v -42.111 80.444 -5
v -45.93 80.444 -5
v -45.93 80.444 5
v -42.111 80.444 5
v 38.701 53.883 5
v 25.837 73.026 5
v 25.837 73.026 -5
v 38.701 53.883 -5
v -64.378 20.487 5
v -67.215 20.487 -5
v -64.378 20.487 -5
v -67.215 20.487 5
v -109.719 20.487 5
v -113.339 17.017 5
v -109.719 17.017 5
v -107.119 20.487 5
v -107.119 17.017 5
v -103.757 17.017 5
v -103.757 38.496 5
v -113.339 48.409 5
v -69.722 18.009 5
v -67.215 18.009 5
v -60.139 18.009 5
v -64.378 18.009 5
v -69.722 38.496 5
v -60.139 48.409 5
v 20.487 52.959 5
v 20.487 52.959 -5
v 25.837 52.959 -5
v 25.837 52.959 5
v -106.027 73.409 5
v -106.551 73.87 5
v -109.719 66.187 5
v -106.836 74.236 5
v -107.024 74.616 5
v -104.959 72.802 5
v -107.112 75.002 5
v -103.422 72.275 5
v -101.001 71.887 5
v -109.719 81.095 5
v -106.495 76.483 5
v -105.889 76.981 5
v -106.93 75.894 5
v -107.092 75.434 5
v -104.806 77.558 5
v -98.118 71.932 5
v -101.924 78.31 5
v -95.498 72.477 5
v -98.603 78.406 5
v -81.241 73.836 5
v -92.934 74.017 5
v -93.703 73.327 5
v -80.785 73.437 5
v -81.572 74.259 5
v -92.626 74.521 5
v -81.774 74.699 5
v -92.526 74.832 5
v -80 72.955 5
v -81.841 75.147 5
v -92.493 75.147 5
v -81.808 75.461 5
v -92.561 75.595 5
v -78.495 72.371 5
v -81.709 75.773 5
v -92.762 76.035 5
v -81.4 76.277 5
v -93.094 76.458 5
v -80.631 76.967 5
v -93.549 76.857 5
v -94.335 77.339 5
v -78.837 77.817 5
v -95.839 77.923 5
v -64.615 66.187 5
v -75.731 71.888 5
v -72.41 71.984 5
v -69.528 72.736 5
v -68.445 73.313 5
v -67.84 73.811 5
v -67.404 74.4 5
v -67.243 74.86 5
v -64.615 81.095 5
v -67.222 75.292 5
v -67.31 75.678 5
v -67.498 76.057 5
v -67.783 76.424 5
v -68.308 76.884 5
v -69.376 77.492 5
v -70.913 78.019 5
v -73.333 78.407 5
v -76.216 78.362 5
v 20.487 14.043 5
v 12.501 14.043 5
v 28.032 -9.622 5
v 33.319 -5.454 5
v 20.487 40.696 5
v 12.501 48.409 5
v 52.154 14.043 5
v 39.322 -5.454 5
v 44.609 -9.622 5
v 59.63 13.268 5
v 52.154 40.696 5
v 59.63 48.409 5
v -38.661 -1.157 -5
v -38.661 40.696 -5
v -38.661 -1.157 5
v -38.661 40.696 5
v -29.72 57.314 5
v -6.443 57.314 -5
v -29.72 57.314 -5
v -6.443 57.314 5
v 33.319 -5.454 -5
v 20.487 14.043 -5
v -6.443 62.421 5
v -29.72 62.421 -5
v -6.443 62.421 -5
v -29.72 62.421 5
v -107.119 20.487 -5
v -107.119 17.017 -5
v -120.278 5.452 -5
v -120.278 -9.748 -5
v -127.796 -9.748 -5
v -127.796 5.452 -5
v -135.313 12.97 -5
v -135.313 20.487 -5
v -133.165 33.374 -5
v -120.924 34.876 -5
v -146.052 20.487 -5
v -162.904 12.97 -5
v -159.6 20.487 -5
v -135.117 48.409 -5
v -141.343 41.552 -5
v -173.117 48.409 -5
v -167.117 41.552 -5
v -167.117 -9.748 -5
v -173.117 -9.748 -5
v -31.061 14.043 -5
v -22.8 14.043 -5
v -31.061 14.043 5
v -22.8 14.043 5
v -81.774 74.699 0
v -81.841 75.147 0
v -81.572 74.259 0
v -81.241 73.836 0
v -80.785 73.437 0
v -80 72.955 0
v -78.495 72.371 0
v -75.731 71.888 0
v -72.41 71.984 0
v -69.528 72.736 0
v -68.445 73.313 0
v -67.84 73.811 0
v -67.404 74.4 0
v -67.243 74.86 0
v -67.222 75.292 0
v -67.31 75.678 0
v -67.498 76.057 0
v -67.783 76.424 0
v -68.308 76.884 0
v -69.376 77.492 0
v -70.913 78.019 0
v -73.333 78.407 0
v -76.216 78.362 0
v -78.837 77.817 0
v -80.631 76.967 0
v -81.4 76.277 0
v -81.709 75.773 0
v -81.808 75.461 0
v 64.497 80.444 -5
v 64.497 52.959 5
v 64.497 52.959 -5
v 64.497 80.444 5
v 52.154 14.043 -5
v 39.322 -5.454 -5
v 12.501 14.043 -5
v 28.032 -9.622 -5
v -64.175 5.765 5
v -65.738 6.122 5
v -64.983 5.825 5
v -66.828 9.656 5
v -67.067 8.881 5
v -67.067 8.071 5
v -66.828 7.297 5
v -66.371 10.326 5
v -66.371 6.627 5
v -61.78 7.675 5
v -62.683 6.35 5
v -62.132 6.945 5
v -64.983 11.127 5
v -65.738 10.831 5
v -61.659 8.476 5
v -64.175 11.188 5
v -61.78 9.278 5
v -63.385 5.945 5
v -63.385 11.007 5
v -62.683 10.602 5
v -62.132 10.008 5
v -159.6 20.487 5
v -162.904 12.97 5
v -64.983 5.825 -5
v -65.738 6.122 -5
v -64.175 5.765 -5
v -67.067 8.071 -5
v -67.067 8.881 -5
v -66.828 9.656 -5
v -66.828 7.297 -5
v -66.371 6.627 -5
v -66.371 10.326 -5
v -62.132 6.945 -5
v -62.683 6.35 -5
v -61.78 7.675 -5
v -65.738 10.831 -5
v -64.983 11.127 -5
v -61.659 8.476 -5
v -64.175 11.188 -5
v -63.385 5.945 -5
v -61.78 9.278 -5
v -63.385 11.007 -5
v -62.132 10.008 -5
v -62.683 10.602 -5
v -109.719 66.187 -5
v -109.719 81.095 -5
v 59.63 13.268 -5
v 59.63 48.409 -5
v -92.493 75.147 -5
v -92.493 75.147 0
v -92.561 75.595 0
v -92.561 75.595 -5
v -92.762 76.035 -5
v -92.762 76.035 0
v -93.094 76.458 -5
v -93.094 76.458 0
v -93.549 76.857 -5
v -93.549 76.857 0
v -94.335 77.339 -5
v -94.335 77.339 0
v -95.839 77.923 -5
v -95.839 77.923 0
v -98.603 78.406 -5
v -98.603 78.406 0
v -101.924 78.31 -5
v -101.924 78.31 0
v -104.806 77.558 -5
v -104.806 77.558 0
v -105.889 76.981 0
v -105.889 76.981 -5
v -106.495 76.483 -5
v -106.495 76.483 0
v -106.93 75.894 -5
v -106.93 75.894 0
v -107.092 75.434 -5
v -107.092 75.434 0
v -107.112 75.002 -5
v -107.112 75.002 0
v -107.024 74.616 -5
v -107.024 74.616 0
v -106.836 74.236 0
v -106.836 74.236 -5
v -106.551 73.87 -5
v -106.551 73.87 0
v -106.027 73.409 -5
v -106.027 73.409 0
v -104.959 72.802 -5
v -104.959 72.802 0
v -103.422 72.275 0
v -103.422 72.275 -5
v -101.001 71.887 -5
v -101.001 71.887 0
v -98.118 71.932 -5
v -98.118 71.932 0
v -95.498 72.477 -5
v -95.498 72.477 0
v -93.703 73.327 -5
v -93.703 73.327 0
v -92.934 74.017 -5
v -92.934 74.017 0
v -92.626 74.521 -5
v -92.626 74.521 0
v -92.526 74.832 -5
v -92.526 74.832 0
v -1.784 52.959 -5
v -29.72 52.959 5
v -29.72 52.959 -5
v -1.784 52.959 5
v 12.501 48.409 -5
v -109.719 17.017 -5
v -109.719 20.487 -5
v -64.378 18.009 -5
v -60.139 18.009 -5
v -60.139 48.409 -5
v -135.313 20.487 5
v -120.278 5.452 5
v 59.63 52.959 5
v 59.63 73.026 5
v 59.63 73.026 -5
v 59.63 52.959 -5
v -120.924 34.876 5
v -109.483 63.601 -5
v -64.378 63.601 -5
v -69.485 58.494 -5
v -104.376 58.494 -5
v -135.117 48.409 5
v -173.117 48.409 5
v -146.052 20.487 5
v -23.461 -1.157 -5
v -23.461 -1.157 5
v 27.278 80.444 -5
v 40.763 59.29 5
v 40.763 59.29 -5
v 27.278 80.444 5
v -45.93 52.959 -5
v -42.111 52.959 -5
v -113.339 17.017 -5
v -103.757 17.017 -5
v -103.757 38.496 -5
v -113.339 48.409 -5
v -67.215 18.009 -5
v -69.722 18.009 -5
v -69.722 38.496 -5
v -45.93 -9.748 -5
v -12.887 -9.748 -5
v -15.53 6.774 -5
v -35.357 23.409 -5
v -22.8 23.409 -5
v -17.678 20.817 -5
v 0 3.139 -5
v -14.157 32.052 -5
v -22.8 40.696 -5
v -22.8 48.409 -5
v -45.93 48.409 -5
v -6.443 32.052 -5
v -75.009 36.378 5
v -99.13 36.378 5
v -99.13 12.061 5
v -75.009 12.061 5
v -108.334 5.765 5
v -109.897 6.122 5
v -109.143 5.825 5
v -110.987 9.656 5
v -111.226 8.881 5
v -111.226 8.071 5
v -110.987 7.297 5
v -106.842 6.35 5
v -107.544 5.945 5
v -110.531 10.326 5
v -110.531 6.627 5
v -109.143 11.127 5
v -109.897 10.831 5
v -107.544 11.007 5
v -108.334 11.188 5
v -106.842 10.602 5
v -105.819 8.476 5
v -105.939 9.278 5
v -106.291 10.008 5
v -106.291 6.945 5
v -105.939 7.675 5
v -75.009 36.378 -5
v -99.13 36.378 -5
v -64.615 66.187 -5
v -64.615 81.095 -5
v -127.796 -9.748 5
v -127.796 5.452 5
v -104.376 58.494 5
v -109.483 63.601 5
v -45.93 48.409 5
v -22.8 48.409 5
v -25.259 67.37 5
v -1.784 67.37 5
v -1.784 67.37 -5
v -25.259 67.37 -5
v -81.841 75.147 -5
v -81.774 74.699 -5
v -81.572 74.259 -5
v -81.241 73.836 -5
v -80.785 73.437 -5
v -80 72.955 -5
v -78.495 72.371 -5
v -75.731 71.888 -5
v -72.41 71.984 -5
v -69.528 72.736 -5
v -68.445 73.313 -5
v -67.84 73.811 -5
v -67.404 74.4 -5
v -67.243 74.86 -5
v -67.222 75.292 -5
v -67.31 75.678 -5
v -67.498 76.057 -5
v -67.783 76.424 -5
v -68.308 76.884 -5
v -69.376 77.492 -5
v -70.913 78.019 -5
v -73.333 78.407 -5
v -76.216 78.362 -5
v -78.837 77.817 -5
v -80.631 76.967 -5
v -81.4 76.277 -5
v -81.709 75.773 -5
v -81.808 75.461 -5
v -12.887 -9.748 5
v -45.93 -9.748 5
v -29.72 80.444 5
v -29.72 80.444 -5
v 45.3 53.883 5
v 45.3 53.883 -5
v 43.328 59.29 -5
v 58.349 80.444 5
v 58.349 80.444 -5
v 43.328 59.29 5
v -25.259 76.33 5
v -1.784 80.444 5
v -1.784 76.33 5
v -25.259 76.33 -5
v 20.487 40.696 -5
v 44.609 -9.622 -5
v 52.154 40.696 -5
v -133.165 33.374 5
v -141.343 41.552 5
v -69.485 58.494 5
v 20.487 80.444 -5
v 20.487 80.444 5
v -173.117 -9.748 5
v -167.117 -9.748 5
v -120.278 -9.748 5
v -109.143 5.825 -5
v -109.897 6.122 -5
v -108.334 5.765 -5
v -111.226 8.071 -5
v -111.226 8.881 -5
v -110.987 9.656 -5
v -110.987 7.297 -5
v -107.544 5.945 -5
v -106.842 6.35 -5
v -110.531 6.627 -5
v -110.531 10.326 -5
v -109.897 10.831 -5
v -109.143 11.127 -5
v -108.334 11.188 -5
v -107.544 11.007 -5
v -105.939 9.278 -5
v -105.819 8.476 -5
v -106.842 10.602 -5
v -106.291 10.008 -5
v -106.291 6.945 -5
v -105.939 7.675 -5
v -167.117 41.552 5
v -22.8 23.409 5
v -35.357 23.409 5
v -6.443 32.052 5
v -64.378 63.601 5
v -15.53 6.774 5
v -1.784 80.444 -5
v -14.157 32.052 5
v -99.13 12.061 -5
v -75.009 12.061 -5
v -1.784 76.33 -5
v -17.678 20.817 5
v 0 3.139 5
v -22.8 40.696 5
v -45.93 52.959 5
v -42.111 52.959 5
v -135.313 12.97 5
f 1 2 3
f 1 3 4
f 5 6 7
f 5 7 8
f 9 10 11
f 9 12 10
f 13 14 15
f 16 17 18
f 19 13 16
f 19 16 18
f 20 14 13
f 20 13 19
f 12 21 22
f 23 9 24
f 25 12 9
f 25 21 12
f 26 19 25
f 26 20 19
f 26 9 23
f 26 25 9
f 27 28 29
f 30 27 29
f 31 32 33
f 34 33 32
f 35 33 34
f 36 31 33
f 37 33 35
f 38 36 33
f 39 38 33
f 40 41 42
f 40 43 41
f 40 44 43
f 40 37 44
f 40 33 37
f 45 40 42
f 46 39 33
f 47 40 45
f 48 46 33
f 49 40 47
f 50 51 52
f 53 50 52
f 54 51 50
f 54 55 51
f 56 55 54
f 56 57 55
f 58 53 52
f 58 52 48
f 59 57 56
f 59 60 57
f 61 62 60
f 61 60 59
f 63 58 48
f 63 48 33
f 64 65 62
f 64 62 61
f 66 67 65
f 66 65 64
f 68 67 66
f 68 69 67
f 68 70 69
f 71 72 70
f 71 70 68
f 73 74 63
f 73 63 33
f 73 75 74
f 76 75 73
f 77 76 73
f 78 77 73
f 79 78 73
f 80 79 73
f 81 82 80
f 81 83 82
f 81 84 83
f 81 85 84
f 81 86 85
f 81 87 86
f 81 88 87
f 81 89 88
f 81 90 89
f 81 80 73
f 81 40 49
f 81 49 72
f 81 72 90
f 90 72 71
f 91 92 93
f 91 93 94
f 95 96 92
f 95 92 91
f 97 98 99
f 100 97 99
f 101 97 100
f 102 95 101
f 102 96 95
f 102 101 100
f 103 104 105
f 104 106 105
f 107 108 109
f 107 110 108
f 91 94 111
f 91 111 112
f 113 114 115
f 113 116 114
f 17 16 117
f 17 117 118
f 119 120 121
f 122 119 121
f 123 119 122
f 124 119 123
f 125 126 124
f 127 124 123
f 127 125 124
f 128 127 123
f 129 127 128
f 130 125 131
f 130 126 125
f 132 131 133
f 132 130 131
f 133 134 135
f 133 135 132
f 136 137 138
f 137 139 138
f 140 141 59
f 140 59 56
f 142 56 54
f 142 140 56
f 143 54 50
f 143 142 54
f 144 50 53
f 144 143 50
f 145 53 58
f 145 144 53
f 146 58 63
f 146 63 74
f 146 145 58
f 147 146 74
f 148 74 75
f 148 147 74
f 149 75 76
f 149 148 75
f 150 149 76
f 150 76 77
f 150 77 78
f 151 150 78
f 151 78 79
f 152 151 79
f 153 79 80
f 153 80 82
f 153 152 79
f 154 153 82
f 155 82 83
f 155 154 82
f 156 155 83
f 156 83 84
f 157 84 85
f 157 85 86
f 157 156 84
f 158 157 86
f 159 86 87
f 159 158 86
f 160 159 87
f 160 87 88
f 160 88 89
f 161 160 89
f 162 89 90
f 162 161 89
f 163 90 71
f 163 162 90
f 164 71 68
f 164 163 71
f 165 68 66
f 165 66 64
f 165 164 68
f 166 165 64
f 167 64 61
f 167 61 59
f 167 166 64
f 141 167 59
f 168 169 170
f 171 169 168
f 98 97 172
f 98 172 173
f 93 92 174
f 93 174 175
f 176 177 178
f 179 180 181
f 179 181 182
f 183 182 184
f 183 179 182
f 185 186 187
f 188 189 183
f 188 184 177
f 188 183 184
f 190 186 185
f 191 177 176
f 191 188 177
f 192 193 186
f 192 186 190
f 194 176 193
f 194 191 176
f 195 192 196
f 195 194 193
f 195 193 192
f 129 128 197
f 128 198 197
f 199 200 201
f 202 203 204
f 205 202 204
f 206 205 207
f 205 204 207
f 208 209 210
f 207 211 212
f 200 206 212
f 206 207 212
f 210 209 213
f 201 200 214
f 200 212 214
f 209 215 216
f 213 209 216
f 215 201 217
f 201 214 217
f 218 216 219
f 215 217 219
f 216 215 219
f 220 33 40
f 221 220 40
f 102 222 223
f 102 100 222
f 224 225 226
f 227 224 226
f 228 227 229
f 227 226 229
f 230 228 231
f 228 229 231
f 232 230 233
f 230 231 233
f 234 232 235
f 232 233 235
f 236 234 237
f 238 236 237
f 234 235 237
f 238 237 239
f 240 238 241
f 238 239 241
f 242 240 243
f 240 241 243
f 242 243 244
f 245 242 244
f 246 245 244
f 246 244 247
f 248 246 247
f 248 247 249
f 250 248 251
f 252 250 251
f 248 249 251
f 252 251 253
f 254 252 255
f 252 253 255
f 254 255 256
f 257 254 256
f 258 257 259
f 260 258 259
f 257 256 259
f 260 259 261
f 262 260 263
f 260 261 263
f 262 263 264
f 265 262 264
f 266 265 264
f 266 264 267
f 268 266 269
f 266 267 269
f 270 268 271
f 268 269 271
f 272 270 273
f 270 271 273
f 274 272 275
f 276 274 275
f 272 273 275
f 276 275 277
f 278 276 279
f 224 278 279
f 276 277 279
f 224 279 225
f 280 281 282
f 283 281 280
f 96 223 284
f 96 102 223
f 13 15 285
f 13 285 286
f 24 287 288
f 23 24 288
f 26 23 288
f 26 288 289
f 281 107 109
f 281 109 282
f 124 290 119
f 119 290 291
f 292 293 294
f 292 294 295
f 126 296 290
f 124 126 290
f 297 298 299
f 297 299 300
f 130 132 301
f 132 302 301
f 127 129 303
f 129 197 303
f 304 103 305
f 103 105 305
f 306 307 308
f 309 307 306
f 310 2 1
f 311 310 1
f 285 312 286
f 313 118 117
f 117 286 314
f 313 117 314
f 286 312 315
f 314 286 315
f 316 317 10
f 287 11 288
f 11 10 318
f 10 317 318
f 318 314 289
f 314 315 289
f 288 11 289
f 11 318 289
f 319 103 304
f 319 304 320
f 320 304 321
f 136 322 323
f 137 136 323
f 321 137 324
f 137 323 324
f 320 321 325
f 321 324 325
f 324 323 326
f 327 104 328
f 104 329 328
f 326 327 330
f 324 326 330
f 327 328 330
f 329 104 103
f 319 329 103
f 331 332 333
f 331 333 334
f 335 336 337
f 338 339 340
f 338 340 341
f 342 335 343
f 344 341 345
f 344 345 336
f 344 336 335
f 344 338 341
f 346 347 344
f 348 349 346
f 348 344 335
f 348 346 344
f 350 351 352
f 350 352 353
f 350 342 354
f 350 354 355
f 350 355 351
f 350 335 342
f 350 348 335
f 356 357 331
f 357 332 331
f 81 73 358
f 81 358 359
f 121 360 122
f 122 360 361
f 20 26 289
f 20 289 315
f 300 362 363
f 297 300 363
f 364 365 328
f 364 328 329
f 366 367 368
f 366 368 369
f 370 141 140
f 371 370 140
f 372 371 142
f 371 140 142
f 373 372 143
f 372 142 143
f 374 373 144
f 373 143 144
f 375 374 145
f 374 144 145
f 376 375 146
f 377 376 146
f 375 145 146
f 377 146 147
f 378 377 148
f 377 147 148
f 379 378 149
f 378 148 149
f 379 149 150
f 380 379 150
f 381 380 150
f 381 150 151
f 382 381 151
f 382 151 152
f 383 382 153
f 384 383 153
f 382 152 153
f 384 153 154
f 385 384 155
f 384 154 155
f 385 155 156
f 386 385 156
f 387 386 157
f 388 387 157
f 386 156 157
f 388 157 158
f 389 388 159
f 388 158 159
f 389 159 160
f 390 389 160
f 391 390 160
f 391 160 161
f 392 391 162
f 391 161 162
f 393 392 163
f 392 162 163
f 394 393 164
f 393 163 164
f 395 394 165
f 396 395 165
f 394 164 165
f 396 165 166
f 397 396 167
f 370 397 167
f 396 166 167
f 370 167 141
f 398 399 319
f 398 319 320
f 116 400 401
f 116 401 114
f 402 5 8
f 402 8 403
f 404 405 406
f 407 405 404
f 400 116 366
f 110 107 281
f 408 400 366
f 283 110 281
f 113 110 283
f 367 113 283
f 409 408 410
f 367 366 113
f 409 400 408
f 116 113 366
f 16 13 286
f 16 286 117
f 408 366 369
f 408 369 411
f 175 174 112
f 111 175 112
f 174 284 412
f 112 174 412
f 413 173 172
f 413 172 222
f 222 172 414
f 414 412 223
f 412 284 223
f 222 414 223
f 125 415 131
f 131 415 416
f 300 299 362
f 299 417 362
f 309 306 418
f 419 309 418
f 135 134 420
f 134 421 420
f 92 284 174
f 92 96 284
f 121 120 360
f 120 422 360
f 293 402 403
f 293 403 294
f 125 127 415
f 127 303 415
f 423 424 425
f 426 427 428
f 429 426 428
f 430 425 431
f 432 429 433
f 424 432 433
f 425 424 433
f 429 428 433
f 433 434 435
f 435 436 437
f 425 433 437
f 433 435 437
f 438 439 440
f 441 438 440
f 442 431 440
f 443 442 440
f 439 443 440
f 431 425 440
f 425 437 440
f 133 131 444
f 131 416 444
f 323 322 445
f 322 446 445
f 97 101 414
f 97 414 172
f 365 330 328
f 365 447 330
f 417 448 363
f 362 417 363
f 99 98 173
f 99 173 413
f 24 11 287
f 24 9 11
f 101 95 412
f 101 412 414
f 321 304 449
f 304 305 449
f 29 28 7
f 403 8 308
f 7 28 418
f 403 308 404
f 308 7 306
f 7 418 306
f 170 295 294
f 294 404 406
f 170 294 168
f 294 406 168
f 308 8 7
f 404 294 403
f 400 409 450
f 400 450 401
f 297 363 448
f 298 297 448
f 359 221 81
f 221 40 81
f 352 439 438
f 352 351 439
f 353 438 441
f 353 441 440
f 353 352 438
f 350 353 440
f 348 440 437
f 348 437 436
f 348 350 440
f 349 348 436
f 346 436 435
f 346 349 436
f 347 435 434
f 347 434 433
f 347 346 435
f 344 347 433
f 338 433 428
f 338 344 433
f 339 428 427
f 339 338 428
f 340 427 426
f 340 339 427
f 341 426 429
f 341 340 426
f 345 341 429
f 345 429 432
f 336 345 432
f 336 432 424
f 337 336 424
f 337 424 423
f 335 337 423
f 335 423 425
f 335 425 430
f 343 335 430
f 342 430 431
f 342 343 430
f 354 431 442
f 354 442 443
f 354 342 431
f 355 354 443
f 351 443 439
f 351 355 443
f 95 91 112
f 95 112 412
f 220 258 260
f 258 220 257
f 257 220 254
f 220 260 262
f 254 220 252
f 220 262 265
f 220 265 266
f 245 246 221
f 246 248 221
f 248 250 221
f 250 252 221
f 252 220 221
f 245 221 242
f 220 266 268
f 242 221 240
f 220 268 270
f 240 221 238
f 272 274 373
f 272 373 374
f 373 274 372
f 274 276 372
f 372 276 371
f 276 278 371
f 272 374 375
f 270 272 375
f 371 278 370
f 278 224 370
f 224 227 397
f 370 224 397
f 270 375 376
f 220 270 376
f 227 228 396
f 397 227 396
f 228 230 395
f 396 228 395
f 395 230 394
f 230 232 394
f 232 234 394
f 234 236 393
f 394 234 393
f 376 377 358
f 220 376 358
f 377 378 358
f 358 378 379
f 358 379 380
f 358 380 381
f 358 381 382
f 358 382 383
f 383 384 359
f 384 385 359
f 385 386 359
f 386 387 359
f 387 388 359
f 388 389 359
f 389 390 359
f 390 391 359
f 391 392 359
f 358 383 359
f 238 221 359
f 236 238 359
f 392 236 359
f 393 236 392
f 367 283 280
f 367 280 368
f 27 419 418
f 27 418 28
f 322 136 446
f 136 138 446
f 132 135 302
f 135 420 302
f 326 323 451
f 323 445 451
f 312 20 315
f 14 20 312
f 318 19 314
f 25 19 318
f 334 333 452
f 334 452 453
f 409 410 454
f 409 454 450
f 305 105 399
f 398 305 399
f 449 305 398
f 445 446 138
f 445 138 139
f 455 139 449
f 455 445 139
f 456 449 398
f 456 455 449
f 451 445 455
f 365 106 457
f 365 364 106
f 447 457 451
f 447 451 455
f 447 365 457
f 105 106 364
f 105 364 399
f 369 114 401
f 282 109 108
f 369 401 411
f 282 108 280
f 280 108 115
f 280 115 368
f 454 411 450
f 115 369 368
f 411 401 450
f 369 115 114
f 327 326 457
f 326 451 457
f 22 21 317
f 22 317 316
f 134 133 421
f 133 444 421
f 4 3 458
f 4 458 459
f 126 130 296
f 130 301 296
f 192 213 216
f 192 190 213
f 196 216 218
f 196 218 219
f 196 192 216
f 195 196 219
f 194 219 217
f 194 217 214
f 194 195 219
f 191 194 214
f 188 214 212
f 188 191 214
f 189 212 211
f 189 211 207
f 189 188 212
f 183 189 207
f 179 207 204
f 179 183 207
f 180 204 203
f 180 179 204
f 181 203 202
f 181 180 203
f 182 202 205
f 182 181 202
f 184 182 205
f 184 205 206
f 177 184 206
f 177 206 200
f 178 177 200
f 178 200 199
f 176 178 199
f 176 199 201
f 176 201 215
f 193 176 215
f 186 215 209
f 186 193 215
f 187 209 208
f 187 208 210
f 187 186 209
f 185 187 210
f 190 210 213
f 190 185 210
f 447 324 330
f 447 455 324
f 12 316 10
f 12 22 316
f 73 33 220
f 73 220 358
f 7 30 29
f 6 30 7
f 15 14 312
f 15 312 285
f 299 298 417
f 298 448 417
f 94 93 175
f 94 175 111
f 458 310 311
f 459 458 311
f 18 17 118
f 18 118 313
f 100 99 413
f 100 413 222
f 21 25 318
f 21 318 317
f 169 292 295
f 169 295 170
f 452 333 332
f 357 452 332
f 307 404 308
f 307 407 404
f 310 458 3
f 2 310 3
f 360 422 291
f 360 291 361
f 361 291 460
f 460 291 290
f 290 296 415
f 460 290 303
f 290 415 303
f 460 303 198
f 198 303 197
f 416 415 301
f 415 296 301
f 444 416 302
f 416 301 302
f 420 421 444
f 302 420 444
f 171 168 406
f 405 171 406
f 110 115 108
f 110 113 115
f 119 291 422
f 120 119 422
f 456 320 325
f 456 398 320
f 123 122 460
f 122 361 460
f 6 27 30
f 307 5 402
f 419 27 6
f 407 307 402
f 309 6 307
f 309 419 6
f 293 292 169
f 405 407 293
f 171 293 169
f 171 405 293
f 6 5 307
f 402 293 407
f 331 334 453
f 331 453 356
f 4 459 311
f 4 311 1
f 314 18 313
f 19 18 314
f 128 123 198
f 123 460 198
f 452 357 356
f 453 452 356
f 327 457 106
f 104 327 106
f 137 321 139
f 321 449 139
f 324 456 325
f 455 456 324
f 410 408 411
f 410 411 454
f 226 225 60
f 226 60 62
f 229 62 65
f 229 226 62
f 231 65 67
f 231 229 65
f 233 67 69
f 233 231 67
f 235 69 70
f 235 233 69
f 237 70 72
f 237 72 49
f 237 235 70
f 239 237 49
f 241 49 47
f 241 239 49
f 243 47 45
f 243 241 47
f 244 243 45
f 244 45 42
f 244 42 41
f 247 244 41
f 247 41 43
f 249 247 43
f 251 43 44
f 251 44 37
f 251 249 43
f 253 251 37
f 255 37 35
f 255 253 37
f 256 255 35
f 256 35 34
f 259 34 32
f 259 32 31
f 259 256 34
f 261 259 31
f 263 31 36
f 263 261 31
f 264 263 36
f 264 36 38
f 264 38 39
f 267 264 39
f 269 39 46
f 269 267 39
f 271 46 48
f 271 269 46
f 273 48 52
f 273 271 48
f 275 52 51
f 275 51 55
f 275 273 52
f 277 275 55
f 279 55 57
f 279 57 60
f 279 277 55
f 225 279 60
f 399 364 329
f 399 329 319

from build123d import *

# Parameters (mm, degrees)
BOSS_EXTRUDE3_DEPTH    = 5
BOSS_EXTRUDE3_2_DEPTH  = 5
SKETCH1_W              = 24.121739131
SKETCH1_H              = 24.317391305
BOSS_EXTRUDE3_3_DEPTH  = 5
BOSS_EXTRUDE3_4_DEPTH  = 5
BOSS_EXTRUDE3_5_DEPTH  = 5
BOSS_EXTRUDE3_6_DEPTH  = 5
BOSS_EXTRUDE3_7_DEPTH  = 5
SKETCH1_W_2            = 3.819491882
SKETCH1_H_2            = 27.485489058
BOSS_EXTRUDE3_8_DEPTH  = 5
SKETCH1_W_3            = 45.104347826
SKETCH1_H_3            = 14.908058774
SKETCH1_RX             = 7.313043478
SKETCH1_RY             = 3.304347826
BOSS_EXTRUDE3_9_DEPTH  = 5
SKETCH1_R              = 2.718976156
BOSS_EXTRUDE3_10_DEPTH = 5
BOSS_EXTRUDE3_11_DEPTH = 5
BOSS_EXTRUDE3_12_DEPTH = 5


with BuildPart() as part:
    # Sketch1 → Boss-Extrude3 (new body, symmetric)
    with BuildSketch(Plane.XY):
        Polygon((-120.27826087, 5.452173913), (-120.27826087, -9.747826087), (-127.795652174, -9.747826087), (-127.795652174, 5.452173913), (-135.313043478, 12.969565217), (-162.904347826, 12.969565217), (-159.6, 20.486956522), (-146.052173913, 20.486956522), (-133.165217391, 33.373913043), (-141.343478261, 41.552173913), (-167.117391304, 41.552173913), (-167.117391304, -9.747826087), (-173.117391304, -9.747826087), (-173.117391304, 48.408695652), (-135.117391304, 48.408695652), (-120.923913043, 34.876086957), (-135.313043478, 20.486956522), align=None)
    extrude(amount=BOSS_EXTRUDE3_DEPTH, both=True)


with BuildPart() as body_2:
    # Sketch1 → Boss-Extrude3 2 (new body, symmetric)
    with BuildSketch(Plane.XY):
        Polygon((-64.378336245, 20.486956522), (-64.378336245, 18.008695652), (-60.139130435, 18.008695652), (-60.139130435, 48.408695652), (-113.339130435, 48.408695652), (-113.339130435, 17.017391304), (-109.719350943, 17.017391304), (-109.719350943, 20.486956522), (-107.119350943, 20.486956522), (-107.119350943, 17.017391304), (-103.756521739, 17.017391304), (-103.756521739, 38.495652174), (-69.72173913, 38.495652174), (-69.72173913, 18.008695652), (-67.215003117, 18.008695652), (-67.215003117, 20.486956522), align=None)
    extrude(amount=BOSS_EXTRUDE3_2_DEPTH, both=True)


with BuildPart() as body_3:
    # Sketch1 → Boss-Extrude3 3 (new body, symmetric)
    with BuildSketch(Plane.XY):
        with Locations((-87.069565218, 24.219565218)):
            Rectangle(SKETCH1_W, SKETCH1_H)
    extrude(amount=BOSS_EXTRUDE3_3_DEPTH, both=True)


with BuildPart() as body_4:
    # Sketch1 → Boss-Extrude3 4 (new body, symmetric)
    with BuildSketch(Plane.XY):
        Polygon((-6.443478261, 32.052173913), (-22.8, 48.408695652), (-45.930434783, 48.408695652), (-45.930434783, -9.747826087), (-12.886956522, -9.747826087), (0, 3.139130435), (-17.67826087, 20.817391304), align=None)
        Polygon((-22.8, 40.695652174), (-38.660869565, 40.695652174), (-38.660869565, -1.156521739), (-23.460869565, -1.156521739), (-15.530434783, 6.773913043), (-22.8, 14.043478261), (-31.060869565, 14.043478261), (-35.356521739, 23.408695652), (-22.8, 23.408695652), (-14.156521739, 32.052173913), align=None, mode=Mode.SUBTRACT)
    extrude(amount=BOSS_EXTRUDE3_4_DEPTH, both=True)


with BuildPart() as body_5:
    # Sketch1 → Boss-Extrude3 5 (new body, symmetric)
    with BuildSketch(Plane.XY):
        Polygon((22.469565217, 48.408695652), (20.486956522, 48.408695652), (12.501449275, 48.408695652), (12.501449275, 14.043478261), (28.031884058, -9.622002049), (33.31884058, -5.453800649), (20.486956522, 14.043478261), (20.486956522, 40.695652174), (52.153623188, 40.695652174), (52.153623188, 14.043478261), (39.32173913, -5.453800649), (44.608695652, -9.622002049), (59.630424795, 13.268305931), (59.630424795, 48.408695652), align=None)
    extrude(amount=BOSS_EXTRUDE3_5_DEPTH, both=True)


with BuildPart() as body_6:
    # Sketch1 → Boss-Extrude3 6 (new body, symmetric)
    with BuildSketch(Plane.XY):
        Polygon((40.763008919, 59.289606781), (27.278060495, 80.44442172), (20.486956522, 80.44442172), (20.486956522, 52.958932662), (25.836790706, 52.958932662), (25.836790706, 73.025903847), (38.701020247, 53.882625327), (45.300153316, 53.882625327), (59.630424795, 73.025903847), (59.630424795, 52.958932662), (64.496708103, 52.958932662), (64.496708103, 80.44442172), (58.349410718, 80.44442172), (43.327681575, 59.289606781), align=None)
    extrude(amount=BOSS_EXTRUDE3_6_DEPTH, both=True)


with BuildPart() as body_7:
    # Sketch1 → Boss-Extrude3 7 (new body, symmetric)
    with BuildSketch(Plane.XY):
        Polygon((-6.443478261, 57.314414193), (-29.719943735, 57.314414193), (-29.719943735, 52.958932662), (-1.783872889, 52.958932662), (-1.783872889, 67.370018987), (-25.259184035, 67.370018987), (-25.259184035, 76.330251673), (-1.783872889, 76.330251673), (-1.783872889, 80.44442172), (-29.719943735, 80.44442172), (-29.719943735, 62.421150206), (-6.443478261, 62.421150206), align=None)
    extrude(amount=BOSS_EXTRUDE3_7_DEPTH, both=True)


with BuildPart() as body_8:
    # Sketch1 → Boss-Extrude3 8 (new body, symmetric)
    with BuildSketch(Plane.XY):
        with Locations((-44.020688842, 66.701677191)):
            Rectangle(SKETCH1_W_2, SKETCH1_H_2)
    extrude(amount=BOSS_EXTRUDE3_8_DEPTH, both=True)


with BuildPart() as body_9:
    # Sketch1 → Boss-Extrude3 9 (new body, symmetric)
    with BuildSketch(Plane.XY):
        with Locations((-87.16717703, 73.640714016)):
            Rectangle(SKETCH1_W_3, SKETCH1_H_3)
        with Locations((-99.806307464, 75.146917316)):
            Ellipse(SKETCH1_RX, SKETCH1_RY, mode=Mode.SUBTRACT)
        with Locations(Location((-74.528046595, 75.146917316), (0, 0, 180))):
            Ellipse(SKETCH1_RX, SKETCH1_RY, mode=Mode.SUBTRACT)
    extrude(amount=BOSS_EXTRUDE3_9_DEPTH, both=True)


with BuildPart() as body_10:
    # Sketch1 → Boss-Extrude3 10 (new body, symmetric)
    with BuildSketch(Plane.XY):
        with Locations((-108.537499539, 8.476225085)):
            Circle(SKETCH1_R)
    extrude(amount=BOSS_EXTRUDE3_10_DEPTH, both=True)


with BuildPart() as body_11:
    # Sketch1 → Boss-Extrude3 11 (new body, symmetric)
    with BuildSketch(Plane.XY):
        with Locations((-64.378336245, 8.476225085)):
            Circle(SKETCH1_R)
    extrude(amount=BOSS_EXTRUDE3_11_DEPTH, both=True)


with BuildPart() as body_12:
    # Sketch1 → Boss-Extrude3 12 (new body, symmetric)
    with BuildSketch(Plane.XY):
        Polygon((-109.482684071, 63.600618954), (-64.378336245, 63.600618954), (-69.485072259, 58.493882941), (-104.375948057, 58.493882941), align=None)
    extrude(amount=BOSS_EXTRUDE3_12_DEPTH, both=True)


solid = Compound([part.part, body_2.part, body_3.part, body_4.part, body_5.part, body_6.part, body_7.part, body_8.part, body_9.part, body_10.part, body_11.part, body_12.part])
